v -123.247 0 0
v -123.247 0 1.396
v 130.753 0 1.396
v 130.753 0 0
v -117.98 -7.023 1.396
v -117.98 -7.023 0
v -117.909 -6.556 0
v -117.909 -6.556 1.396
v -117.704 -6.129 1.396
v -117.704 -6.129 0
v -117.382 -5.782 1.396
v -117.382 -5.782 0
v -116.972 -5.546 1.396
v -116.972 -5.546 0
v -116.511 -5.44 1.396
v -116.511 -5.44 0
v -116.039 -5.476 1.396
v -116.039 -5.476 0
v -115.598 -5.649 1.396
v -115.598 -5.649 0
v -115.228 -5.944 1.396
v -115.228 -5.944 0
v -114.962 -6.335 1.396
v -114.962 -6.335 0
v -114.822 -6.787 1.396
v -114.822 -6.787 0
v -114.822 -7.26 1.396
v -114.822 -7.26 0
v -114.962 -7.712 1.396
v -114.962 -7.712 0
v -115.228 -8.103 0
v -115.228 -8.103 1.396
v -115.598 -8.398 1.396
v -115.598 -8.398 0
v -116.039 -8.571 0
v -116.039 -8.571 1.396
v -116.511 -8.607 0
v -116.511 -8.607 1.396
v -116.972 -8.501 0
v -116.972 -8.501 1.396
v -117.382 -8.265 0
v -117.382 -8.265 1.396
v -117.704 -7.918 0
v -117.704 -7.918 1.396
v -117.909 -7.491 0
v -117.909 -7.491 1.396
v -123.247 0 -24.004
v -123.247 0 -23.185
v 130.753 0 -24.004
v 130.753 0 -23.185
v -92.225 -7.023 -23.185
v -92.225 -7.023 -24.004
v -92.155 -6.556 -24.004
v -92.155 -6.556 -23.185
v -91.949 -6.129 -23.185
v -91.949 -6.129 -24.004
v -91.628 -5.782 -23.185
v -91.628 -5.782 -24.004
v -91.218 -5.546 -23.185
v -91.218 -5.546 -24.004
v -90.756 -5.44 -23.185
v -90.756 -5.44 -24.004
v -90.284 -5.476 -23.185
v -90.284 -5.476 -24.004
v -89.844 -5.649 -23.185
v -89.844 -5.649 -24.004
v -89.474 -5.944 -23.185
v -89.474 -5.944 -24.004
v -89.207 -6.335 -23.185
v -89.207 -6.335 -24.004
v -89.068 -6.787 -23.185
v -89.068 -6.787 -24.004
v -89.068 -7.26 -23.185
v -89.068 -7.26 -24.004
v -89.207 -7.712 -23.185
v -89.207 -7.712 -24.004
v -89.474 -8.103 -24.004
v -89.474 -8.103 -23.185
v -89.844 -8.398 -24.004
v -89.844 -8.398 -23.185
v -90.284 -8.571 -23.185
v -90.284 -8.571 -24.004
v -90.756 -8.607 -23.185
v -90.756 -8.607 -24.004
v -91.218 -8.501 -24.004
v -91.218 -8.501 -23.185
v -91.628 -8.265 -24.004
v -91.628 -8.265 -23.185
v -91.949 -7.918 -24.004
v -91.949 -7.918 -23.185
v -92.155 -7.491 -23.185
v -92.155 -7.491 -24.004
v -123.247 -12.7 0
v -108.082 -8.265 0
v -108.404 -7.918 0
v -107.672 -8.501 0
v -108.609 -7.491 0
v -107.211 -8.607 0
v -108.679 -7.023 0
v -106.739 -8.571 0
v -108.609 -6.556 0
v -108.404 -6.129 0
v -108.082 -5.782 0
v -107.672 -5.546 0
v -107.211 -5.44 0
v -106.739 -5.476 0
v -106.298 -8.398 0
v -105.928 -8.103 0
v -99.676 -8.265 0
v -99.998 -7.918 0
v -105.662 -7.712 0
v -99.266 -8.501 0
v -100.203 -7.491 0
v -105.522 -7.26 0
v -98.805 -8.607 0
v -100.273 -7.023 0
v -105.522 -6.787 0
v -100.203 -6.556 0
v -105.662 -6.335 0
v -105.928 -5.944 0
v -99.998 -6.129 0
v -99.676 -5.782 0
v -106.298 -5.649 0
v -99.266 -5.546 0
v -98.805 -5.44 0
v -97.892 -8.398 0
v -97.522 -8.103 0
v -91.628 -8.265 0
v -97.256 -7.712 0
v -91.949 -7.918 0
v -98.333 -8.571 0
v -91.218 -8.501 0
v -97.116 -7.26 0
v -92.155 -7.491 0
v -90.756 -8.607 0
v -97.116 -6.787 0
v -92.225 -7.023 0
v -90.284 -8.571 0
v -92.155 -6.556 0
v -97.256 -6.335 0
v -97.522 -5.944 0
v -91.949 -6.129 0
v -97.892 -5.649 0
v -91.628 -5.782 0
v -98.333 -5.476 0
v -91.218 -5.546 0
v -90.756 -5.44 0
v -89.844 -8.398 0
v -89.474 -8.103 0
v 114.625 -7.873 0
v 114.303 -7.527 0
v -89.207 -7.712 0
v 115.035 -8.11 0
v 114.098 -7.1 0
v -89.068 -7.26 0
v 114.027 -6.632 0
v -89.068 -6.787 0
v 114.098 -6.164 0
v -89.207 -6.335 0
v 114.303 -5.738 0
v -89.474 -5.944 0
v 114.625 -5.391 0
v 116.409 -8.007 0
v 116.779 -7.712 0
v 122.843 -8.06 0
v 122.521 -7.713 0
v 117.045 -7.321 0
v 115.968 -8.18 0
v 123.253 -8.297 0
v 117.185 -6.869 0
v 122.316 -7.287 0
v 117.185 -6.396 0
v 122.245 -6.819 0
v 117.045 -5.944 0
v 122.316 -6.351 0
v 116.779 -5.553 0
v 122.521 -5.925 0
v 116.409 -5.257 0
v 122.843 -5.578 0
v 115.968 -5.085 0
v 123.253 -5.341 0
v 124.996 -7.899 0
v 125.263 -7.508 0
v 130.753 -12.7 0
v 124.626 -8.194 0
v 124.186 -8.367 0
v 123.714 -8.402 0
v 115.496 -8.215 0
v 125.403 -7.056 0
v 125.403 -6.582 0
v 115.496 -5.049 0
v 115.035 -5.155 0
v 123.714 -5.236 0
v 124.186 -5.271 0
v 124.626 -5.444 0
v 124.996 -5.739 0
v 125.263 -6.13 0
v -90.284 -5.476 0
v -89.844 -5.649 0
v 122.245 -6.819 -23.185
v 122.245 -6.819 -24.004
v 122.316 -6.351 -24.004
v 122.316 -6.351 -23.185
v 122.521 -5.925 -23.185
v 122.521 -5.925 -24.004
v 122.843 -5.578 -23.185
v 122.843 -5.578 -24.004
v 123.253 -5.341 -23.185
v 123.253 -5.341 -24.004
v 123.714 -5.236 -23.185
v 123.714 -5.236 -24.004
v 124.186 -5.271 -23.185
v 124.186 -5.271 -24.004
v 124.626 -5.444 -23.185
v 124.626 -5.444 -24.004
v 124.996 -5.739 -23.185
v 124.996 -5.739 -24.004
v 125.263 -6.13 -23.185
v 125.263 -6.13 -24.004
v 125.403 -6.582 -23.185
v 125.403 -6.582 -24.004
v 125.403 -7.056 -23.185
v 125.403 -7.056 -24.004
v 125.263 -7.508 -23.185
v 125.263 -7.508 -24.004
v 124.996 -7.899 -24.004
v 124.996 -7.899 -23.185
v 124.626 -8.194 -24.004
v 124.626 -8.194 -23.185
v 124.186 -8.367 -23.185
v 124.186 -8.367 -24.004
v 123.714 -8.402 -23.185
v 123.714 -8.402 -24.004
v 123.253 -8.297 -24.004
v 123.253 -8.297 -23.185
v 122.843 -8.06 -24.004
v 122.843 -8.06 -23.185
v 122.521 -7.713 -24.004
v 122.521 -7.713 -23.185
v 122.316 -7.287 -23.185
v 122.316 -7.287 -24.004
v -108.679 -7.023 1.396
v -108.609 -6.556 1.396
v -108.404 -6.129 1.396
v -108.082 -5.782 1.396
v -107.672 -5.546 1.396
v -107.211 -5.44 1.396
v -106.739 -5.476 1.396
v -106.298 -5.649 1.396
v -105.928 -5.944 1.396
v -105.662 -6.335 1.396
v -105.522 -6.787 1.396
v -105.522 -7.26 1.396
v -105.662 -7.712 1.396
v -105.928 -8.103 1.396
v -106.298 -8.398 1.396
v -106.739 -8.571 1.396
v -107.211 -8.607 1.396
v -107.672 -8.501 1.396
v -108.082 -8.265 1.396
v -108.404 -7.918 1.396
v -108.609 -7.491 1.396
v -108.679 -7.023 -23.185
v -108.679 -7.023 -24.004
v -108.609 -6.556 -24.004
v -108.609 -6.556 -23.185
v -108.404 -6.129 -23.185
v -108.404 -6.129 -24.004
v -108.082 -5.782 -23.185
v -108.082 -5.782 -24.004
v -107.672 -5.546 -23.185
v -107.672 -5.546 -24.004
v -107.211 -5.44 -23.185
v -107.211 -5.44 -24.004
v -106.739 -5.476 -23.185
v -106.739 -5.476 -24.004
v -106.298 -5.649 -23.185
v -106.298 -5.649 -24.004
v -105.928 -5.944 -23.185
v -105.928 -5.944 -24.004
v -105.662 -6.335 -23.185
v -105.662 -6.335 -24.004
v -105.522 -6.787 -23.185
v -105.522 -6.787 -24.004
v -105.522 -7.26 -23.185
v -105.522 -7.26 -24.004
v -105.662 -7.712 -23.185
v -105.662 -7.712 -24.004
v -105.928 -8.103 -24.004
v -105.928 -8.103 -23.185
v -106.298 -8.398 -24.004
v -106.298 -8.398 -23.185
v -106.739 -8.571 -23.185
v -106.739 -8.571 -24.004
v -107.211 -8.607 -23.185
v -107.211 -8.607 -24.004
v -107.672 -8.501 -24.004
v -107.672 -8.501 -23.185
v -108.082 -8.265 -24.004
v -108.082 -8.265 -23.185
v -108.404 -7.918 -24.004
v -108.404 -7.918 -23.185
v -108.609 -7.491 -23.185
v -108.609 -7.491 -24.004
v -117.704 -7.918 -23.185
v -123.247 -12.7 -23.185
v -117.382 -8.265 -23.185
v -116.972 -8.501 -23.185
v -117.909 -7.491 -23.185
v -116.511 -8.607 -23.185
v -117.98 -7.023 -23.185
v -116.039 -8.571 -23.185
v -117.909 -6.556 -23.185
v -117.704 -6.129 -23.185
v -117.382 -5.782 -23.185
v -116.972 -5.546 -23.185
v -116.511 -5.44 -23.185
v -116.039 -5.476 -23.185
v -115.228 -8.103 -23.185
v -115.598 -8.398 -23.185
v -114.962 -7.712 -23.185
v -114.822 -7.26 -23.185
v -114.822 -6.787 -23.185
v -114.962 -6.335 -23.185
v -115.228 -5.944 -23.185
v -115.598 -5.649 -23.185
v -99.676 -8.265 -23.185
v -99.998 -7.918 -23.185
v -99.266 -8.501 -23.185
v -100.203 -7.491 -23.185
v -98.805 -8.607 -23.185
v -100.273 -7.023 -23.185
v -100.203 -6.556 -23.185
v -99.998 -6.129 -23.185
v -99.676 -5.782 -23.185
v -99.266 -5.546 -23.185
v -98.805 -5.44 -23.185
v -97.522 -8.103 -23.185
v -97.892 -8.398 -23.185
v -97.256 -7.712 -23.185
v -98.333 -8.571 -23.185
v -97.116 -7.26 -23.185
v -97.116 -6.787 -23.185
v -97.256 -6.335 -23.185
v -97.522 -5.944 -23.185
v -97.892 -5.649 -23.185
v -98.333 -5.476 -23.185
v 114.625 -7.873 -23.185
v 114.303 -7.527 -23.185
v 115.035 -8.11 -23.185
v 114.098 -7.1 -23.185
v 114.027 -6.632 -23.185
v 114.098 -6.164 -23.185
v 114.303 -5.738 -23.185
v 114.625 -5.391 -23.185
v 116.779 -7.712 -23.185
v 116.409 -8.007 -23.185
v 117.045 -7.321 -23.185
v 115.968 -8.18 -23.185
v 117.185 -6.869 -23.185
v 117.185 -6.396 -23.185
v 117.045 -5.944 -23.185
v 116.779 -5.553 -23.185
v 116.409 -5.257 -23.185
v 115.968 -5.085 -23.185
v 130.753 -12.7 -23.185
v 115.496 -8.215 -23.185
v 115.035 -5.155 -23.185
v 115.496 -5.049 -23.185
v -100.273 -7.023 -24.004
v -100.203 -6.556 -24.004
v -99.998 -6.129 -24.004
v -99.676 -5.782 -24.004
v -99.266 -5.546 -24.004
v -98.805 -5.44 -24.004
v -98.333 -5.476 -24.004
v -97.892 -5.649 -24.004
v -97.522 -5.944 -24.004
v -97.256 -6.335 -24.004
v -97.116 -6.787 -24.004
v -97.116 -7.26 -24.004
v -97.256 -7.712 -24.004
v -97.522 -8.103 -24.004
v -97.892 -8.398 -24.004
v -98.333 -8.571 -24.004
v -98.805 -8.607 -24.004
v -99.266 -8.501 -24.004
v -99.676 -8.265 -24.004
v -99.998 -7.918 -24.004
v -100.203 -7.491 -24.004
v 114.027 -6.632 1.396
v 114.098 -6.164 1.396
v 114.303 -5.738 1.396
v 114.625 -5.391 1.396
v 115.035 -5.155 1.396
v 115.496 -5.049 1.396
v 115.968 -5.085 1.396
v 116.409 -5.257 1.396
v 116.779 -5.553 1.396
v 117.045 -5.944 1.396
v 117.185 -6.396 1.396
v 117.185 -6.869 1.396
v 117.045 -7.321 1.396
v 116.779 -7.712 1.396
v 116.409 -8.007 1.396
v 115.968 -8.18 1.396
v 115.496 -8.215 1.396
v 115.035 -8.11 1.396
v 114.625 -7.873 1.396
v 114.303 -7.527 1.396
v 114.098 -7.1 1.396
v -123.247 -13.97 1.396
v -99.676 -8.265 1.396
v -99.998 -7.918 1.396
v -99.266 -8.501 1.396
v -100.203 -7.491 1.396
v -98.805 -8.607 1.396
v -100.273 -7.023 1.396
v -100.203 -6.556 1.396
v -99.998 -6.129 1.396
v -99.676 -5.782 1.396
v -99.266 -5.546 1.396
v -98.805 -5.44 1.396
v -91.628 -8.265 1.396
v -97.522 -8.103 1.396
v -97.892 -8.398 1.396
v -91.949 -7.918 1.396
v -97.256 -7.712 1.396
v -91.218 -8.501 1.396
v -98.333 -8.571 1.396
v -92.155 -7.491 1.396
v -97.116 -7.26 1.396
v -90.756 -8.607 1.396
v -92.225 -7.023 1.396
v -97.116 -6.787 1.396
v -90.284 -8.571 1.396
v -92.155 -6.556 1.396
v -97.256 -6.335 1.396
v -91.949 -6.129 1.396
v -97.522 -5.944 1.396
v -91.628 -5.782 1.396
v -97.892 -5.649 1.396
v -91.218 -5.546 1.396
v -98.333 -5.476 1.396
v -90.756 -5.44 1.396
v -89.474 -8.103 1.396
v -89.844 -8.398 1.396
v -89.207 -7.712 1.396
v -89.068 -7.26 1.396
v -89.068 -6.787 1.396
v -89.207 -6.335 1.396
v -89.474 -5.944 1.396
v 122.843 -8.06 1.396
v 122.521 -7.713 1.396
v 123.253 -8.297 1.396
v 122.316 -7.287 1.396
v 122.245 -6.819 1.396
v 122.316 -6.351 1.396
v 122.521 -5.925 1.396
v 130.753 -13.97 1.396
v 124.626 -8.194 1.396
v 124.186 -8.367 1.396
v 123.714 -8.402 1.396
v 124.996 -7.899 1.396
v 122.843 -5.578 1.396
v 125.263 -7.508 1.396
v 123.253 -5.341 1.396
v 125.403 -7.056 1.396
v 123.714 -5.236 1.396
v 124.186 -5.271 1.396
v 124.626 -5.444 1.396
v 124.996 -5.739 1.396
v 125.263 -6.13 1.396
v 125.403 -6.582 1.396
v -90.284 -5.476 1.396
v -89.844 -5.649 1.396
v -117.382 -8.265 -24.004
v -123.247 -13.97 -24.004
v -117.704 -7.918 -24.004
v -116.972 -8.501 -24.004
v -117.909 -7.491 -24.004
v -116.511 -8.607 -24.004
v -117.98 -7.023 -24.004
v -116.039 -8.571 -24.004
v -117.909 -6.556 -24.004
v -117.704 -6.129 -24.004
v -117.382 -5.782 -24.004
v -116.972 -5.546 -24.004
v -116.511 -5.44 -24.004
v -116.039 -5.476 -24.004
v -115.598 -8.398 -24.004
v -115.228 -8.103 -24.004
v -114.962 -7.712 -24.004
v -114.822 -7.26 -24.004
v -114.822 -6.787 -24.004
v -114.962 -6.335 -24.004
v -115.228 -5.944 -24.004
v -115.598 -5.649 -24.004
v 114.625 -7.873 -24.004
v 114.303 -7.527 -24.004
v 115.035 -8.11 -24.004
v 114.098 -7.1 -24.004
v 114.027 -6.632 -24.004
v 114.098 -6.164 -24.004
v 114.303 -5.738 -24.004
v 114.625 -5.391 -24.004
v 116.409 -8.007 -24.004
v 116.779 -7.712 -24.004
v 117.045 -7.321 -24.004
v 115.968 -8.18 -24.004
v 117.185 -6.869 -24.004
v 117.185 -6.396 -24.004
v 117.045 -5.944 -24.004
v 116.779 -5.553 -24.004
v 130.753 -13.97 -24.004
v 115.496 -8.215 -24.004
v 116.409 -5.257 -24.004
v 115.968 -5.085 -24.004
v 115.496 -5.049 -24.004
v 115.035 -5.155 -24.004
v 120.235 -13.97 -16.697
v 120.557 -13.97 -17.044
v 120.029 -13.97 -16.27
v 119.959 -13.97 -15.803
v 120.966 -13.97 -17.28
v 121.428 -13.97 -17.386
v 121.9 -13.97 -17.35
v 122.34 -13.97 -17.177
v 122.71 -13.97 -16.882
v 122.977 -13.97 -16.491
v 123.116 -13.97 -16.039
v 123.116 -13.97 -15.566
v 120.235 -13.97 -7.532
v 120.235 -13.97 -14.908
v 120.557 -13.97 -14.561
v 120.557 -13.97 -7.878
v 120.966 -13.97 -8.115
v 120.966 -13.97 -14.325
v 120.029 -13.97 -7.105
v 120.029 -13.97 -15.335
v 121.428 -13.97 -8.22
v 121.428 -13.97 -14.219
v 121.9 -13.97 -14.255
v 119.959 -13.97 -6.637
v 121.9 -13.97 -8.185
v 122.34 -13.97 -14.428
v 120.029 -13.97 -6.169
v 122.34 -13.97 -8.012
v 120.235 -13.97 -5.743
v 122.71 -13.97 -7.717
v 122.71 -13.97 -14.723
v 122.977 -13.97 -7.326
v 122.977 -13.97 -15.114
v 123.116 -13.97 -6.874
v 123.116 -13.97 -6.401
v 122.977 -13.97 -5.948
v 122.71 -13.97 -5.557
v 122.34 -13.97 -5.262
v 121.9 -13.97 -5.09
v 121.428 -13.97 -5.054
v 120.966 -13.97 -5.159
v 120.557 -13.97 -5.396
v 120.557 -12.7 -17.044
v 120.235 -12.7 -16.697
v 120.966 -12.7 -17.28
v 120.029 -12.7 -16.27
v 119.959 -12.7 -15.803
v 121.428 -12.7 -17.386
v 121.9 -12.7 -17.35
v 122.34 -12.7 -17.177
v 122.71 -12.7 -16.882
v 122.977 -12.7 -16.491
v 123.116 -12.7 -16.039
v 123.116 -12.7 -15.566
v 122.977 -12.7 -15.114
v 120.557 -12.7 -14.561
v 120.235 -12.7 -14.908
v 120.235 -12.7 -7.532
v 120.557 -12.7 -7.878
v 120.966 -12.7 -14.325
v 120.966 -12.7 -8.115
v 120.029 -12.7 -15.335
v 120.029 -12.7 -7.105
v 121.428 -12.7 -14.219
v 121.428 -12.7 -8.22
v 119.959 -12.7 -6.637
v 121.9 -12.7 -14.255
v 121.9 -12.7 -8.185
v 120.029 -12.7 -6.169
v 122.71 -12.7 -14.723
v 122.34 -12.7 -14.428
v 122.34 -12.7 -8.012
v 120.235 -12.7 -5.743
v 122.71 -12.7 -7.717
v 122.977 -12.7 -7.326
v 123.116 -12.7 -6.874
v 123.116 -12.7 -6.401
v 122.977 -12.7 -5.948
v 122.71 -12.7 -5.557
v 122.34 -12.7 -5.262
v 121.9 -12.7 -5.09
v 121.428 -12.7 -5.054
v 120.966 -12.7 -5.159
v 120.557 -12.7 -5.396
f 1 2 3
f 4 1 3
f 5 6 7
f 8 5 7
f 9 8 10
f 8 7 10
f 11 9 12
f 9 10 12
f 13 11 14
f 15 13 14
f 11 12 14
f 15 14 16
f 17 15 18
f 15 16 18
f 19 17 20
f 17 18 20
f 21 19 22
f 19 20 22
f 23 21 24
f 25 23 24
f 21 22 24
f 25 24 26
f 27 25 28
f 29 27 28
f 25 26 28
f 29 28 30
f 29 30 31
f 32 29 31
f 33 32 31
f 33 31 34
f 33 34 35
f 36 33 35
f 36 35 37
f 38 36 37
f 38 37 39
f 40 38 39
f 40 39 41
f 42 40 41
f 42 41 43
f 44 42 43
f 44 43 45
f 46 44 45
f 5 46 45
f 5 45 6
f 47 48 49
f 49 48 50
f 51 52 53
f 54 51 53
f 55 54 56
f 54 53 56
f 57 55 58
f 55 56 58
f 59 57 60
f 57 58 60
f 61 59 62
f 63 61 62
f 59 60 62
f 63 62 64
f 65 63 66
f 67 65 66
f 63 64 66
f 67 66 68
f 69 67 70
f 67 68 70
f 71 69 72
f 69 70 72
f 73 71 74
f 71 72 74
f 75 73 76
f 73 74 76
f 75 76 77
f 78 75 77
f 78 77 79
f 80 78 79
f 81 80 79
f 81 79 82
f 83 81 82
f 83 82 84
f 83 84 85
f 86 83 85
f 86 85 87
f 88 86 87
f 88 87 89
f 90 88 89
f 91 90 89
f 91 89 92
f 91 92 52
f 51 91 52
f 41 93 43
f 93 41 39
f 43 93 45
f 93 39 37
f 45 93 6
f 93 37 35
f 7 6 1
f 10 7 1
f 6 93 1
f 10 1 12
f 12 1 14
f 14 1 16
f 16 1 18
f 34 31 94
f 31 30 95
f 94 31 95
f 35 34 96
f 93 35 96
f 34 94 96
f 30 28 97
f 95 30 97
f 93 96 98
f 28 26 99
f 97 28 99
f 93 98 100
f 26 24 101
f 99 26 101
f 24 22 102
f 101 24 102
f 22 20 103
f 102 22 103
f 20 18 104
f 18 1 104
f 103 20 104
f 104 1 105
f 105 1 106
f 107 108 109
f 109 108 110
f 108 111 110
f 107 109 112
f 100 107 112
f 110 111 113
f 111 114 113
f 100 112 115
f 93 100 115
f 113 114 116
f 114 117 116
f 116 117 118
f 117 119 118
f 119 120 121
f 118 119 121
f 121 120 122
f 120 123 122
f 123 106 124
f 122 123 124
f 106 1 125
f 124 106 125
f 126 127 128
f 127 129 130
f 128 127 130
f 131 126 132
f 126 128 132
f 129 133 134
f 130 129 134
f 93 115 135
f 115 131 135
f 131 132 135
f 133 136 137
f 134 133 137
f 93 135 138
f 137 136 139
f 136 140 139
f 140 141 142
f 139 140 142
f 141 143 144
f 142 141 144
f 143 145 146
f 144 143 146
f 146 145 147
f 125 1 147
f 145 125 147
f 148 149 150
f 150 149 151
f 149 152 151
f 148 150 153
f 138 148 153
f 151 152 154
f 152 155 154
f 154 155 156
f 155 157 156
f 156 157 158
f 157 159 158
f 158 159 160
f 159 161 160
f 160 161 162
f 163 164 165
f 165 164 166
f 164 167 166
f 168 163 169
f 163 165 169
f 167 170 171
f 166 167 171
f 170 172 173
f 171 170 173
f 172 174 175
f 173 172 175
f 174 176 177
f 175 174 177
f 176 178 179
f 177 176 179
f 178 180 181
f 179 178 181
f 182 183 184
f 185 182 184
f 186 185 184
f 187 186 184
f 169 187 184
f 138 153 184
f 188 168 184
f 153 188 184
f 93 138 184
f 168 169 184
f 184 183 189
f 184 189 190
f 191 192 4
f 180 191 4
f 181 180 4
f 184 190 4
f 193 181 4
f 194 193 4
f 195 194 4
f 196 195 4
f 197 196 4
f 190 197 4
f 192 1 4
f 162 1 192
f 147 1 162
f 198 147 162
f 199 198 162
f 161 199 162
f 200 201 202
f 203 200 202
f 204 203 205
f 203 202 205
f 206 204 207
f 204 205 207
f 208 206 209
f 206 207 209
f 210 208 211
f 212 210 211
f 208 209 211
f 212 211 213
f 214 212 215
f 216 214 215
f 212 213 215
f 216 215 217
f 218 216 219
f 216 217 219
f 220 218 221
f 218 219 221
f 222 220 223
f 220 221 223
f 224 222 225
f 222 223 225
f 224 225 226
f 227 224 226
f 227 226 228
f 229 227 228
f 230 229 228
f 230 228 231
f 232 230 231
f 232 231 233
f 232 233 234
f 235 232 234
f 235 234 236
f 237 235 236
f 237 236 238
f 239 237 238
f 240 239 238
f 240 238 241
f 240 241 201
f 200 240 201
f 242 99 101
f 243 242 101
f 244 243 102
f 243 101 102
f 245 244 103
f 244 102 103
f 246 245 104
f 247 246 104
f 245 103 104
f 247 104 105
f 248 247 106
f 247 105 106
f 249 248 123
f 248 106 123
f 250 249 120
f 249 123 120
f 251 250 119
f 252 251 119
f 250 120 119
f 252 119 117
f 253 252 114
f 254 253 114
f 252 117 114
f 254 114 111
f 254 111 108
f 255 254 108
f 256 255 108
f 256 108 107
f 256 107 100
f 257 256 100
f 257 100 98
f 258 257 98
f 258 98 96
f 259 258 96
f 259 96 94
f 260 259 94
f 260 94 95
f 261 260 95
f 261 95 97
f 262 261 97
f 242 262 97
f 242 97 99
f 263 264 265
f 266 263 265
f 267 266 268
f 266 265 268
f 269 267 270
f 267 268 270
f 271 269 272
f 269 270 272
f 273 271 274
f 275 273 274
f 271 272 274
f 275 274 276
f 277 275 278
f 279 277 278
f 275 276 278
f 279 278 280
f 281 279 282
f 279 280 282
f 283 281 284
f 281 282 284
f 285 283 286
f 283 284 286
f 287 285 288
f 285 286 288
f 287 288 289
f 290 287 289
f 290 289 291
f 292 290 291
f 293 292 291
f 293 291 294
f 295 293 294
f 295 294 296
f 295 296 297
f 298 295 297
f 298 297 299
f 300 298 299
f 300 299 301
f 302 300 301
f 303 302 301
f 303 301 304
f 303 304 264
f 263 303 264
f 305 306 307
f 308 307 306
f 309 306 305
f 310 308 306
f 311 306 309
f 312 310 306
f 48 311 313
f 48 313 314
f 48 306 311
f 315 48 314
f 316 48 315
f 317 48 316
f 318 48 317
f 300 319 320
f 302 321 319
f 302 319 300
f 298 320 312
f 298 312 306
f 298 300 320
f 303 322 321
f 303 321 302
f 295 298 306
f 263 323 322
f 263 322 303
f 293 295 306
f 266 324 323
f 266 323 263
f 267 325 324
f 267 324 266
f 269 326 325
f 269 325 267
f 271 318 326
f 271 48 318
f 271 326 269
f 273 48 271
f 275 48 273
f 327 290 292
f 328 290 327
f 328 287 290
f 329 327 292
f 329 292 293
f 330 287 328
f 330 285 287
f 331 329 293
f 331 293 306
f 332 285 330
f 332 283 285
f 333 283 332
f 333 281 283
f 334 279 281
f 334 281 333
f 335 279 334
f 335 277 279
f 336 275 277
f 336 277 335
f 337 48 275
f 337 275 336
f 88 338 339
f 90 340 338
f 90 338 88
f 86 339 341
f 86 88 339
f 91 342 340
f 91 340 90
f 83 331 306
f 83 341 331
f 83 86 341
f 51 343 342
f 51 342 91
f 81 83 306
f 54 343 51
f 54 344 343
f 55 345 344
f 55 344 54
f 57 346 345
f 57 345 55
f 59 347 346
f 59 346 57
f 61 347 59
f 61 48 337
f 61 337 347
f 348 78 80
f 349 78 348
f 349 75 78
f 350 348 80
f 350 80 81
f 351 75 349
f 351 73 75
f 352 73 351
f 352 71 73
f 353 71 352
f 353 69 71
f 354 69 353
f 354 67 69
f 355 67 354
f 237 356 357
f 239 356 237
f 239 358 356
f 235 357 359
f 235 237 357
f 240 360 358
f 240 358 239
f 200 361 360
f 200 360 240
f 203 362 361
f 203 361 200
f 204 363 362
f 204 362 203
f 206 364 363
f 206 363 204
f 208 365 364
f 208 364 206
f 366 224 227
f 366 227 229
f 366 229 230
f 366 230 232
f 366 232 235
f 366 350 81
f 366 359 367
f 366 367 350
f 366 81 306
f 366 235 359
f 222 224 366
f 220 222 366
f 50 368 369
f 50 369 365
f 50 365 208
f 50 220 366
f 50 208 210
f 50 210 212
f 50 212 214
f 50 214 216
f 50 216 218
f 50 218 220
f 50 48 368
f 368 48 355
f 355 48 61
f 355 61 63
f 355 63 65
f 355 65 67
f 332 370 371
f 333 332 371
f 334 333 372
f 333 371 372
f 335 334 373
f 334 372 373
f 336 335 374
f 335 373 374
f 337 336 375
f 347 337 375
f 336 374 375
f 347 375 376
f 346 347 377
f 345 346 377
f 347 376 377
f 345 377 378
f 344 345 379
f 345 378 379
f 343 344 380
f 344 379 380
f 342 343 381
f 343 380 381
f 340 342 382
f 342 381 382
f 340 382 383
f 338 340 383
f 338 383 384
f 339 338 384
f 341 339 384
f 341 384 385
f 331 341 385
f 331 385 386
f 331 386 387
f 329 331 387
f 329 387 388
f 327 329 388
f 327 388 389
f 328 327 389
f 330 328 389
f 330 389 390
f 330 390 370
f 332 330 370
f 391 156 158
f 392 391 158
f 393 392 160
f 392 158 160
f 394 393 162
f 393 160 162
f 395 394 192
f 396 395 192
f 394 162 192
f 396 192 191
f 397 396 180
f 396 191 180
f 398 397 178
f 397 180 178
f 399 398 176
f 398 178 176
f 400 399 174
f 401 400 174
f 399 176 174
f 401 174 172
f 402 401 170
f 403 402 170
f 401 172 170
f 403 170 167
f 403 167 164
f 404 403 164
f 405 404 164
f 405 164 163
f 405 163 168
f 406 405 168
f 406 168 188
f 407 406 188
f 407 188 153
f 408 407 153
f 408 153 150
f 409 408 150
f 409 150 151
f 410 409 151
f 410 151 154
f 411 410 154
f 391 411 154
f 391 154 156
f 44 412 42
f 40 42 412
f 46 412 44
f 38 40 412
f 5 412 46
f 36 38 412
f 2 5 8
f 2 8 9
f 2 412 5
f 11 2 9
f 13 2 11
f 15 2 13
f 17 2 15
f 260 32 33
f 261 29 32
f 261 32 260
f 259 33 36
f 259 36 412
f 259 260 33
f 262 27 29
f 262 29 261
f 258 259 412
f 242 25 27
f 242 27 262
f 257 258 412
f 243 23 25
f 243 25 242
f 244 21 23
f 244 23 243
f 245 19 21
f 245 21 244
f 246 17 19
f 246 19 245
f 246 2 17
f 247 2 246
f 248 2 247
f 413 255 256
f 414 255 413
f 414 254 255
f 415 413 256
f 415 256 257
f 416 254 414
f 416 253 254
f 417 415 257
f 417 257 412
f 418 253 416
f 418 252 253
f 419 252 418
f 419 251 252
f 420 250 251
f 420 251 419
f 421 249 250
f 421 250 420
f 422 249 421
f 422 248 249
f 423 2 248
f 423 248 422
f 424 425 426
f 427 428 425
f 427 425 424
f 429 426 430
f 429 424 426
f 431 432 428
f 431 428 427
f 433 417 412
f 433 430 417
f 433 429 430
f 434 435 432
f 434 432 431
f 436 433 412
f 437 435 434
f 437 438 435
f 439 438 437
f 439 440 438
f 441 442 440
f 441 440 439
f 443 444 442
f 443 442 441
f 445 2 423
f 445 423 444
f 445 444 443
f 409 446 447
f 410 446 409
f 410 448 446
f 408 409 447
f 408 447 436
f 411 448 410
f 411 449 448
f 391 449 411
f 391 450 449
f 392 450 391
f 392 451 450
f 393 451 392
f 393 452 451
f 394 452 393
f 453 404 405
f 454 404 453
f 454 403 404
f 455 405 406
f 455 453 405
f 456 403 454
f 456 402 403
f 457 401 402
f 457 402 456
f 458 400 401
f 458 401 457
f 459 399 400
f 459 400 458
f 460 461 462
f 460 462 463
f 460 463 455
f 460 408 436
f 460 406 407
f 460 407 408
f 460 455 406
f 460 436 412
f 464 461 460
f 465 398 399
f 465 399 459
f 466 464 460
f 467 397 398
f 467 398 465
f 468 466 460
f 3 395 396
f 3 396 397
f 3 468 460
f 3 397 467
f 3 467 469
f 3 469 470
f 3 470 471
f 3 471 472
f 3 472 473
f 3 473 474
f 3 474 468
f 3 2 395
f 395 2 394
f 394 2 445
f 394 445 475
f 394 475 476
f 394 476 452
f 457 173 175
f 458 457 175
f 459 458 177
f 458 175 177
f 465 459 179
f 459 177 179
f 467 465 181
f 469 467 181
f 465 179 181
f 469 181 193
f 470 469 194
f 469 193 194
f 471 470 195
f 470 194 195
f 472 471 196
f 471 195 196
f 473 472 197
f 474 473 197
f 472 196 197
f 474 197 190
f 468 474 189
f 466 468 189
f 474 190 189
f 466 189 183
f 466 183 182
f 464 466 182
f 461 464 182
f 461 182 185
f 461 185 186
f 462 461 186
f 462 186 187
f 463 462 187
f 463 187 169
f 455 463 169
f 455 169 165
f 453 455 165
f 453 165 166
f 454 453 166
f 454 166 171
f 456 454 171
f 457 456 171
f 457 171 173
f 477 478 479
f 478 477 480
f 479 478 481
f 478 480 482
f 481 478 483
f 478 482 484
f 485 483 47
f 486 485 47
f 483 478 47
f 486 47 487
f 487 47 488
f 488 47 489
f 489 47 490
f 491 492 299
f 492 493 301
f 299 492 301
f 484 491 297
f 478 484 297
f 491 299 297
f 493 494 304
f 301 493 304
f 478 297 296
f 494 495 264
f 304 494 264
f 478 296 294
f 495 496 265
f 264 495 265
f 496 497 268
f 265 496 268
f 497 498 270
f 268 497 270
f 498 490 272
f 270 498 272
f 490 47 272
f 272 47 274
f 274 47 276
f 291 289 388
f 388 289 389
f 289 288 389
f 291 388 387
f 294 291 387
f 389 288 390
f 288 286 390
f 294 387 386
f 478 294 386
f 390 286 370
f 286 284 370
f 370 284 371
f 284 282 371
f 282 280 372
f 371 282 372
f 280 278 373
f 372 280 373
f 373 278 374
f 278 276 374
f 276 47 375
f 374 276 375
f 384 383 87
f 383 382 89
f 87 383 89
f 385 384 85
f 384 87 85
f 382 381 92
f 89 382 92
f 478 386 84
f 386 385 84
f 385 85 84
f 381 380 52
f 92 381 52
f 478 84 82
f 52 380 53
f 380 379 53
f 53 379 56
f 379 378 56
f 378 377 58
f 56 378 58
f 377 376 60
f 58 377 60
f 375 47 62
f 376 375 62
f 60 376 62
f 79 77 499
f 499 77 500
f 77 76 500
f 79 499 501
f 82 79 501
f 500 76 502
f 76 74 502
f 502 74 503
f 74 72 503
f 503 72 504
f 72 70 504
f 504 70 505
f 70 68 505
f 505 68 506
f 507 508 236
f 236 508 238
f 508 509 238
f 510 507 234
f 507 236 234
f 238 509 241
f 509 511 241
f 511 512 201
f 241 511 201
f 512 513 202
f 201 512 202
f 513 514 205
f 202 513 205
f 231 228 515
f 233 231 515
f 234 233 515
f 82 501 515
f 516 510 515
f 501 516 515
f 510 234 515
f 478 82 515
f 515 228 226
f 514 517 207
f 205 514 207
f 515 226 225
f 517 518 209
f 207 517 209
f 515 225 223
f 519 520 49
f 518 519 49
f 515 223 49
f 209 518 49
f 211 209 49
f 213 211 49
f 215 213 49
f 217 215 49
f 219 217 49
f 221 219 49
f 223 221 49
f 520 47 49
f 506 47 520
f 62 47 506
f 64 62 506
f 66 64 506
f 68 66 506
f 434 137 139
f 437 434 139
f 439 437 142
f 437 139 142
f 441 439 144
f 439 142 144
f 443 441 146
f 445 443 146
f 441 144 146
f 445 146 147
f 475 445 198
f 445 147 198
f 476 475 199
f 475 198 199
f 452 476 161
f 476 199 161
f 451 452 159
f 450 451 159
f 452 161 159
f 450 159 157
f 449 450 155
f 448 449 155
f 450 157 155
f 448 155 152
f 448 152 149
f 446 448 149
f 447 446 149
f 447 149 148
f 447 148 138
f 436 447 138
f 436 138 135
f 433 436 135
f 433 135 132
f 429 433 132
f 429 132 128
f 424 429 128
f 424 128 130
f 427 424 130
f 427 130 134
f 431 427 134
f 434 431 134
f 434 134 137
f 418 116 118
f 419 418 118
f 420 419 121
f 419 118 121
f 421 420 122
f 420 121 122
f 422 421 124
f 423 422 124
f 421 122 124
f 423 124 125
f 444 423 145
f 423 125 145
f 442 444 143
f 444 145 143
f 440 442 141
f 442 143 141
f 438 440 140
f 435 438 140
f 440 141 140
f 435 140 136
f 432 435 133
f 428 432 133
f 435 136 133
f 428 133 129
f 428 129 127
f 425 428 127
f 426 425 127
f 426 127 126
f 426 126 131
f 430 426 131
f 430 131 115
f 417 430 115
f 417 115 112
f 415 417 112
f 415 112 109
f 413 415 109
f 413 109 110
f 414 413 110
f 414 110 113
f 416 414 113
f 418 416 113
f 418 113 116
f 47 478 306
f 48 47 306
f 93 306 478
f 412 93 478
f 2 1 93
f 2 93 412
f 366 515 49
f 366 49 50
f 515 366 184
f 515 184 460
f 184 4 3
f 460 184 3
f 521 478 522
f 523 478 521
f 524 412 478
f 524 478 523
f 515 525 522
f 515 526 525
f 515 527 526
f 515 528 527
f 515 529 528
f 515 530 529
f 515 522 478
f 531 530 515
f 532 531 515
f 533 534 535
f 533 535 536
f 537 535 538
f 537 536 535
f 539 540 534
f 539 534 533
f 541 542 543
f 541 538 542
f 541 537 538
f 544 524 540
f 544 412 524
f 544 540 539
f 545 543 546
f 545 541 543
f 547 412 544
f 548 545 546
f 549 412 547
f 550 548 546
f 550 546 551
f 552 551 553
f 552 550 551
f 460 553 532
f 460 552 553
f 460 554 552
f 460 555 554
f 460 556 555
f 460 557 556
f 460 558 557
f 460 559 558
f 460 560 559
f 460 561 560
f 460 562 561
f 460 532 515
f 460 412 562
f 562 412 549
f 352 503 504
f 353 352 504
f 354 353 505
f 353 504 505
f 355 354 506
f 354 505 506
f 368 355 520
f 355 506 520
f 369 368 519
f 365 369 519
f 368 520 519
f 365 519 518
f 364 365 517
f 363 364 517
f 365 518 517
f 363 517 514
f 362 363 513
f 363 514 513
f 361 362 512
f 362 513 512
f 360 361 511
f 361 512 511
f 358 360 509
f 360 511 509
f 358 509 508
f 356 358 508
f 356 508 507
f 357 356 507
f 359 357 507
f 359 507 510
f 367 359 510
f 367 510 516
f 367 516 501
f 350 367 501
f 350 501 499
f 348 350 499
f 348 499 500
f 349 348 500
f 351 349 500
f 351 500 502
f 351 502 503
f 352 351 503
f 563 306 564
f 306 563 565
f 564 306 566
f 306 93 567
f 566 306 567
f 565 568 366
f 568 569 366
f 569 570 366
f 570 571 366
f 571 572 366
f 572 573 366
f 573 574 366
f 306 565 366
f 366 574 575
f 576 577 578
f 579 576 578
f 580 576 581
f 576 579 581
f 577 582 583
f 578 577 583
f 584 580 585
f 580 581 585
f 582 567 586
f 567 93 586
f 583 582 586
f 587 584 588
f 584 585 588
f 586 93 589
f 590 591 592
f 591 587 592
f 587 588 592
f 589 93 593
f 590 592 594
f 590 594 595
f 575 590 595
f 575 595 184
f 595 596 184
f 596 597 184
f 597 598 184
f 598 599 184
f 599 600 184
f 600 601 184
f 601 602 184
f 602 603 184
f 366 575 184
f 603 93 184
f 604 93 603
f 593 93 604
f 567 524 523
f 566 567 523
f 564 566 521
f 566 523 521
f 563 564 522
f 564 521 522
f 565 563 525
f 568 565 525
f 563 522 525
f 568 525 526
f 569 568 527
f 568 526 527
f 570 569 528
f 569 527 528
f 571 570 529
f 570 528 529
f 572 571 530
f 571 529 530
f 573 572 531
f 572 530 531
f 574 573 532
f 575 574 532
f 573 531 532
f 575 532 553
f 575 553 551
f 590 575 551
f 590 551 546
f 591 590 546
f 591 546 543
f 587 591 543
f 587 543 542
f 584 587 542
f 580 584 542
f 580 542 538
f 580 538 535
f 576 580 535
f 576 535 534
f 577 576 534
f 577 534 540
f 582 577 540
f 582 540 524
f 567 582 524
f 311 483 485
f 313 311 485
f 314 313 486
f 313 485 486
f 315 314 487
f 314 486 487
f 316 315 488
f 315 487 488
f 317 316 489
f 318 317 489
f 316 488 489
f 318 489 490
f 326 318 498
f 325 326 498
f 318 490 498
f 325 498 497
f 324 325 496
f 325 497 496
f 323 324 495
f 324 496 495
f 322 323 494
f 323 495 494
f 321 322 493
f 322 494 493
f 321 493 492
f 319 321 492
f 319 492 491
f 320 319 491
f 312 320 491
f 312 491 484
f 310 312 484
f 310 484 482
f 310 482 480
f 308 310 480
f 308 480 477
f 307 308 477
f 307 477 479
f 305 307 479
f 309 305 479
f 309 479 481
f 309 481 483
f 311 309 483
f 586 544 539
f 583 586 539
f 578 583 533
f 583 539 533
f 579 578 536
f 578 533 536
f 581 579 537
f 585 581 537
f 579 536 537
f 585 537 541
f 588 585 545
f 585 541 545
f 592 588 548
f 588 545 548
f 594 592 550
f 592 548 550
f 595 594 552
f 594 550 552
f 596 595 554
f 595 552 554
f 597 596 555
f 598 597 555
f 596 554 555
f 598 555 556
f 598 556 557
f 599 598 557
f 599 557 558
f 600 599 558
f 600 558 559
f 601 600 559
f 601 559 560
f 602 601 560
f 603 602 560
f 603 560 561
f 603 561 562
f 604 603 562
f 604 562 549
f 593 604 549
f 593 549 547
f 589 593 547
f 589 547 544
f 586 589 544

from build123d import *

# Parameters (mm, degrees)
F0_W     = 254
F0_H     = 25.4
F1_DEPTH = 13.97
F2_W     = 267.5041258335
F2_H     = 23.1854785234
F3_DEPTH = 12.7
F5_D     = 3.175
F7_D     = 3.175


with BuildPart() as f1:
    # F0 (on Front) → F1 (new body)
    with BuildSketch(Plane.XZ):
        with Locations((3.752566874, -11.3044876873)):
            Rectangle(F0_W, F0_H)
    extrude(amount=F1_DEPTH)

    # F2 (on Front) → F3 (cut)
    with BuildSketch(Plane.XZ):
        with Locations((1.6082376242, -11.5927392617)):
            Rectangle(F2_W, F2_H)
    extrude(amount=F3_DEPTH, mode=Mode.SUBTRACT)

    # F5 (through all)
    with Locations(Plane.XY.offset(1.3955123127)):
        with Locations((123.8327398896, -6.8190763704), (115.6149059534, -6.6323070787), (-116.3921877742, -7.0234532468), (-107.0919632912, -7.0234532468), (-98.6859947443, -7.0234532468), (-90.6377211213, -7.0234532468)):
            Hole(F5_D / 2)

    # F7 (through all)
    with Locations(Plane(origin=(0, 0, 0), x_dir=(1, 0, 0), z_dir=(0, 1, 0))):
        with Locations((121.5464174747, 6.637244951), (121.5464174747, 15.8025249839)):
            Hole(F7_D / 2)


solid = f1.part
